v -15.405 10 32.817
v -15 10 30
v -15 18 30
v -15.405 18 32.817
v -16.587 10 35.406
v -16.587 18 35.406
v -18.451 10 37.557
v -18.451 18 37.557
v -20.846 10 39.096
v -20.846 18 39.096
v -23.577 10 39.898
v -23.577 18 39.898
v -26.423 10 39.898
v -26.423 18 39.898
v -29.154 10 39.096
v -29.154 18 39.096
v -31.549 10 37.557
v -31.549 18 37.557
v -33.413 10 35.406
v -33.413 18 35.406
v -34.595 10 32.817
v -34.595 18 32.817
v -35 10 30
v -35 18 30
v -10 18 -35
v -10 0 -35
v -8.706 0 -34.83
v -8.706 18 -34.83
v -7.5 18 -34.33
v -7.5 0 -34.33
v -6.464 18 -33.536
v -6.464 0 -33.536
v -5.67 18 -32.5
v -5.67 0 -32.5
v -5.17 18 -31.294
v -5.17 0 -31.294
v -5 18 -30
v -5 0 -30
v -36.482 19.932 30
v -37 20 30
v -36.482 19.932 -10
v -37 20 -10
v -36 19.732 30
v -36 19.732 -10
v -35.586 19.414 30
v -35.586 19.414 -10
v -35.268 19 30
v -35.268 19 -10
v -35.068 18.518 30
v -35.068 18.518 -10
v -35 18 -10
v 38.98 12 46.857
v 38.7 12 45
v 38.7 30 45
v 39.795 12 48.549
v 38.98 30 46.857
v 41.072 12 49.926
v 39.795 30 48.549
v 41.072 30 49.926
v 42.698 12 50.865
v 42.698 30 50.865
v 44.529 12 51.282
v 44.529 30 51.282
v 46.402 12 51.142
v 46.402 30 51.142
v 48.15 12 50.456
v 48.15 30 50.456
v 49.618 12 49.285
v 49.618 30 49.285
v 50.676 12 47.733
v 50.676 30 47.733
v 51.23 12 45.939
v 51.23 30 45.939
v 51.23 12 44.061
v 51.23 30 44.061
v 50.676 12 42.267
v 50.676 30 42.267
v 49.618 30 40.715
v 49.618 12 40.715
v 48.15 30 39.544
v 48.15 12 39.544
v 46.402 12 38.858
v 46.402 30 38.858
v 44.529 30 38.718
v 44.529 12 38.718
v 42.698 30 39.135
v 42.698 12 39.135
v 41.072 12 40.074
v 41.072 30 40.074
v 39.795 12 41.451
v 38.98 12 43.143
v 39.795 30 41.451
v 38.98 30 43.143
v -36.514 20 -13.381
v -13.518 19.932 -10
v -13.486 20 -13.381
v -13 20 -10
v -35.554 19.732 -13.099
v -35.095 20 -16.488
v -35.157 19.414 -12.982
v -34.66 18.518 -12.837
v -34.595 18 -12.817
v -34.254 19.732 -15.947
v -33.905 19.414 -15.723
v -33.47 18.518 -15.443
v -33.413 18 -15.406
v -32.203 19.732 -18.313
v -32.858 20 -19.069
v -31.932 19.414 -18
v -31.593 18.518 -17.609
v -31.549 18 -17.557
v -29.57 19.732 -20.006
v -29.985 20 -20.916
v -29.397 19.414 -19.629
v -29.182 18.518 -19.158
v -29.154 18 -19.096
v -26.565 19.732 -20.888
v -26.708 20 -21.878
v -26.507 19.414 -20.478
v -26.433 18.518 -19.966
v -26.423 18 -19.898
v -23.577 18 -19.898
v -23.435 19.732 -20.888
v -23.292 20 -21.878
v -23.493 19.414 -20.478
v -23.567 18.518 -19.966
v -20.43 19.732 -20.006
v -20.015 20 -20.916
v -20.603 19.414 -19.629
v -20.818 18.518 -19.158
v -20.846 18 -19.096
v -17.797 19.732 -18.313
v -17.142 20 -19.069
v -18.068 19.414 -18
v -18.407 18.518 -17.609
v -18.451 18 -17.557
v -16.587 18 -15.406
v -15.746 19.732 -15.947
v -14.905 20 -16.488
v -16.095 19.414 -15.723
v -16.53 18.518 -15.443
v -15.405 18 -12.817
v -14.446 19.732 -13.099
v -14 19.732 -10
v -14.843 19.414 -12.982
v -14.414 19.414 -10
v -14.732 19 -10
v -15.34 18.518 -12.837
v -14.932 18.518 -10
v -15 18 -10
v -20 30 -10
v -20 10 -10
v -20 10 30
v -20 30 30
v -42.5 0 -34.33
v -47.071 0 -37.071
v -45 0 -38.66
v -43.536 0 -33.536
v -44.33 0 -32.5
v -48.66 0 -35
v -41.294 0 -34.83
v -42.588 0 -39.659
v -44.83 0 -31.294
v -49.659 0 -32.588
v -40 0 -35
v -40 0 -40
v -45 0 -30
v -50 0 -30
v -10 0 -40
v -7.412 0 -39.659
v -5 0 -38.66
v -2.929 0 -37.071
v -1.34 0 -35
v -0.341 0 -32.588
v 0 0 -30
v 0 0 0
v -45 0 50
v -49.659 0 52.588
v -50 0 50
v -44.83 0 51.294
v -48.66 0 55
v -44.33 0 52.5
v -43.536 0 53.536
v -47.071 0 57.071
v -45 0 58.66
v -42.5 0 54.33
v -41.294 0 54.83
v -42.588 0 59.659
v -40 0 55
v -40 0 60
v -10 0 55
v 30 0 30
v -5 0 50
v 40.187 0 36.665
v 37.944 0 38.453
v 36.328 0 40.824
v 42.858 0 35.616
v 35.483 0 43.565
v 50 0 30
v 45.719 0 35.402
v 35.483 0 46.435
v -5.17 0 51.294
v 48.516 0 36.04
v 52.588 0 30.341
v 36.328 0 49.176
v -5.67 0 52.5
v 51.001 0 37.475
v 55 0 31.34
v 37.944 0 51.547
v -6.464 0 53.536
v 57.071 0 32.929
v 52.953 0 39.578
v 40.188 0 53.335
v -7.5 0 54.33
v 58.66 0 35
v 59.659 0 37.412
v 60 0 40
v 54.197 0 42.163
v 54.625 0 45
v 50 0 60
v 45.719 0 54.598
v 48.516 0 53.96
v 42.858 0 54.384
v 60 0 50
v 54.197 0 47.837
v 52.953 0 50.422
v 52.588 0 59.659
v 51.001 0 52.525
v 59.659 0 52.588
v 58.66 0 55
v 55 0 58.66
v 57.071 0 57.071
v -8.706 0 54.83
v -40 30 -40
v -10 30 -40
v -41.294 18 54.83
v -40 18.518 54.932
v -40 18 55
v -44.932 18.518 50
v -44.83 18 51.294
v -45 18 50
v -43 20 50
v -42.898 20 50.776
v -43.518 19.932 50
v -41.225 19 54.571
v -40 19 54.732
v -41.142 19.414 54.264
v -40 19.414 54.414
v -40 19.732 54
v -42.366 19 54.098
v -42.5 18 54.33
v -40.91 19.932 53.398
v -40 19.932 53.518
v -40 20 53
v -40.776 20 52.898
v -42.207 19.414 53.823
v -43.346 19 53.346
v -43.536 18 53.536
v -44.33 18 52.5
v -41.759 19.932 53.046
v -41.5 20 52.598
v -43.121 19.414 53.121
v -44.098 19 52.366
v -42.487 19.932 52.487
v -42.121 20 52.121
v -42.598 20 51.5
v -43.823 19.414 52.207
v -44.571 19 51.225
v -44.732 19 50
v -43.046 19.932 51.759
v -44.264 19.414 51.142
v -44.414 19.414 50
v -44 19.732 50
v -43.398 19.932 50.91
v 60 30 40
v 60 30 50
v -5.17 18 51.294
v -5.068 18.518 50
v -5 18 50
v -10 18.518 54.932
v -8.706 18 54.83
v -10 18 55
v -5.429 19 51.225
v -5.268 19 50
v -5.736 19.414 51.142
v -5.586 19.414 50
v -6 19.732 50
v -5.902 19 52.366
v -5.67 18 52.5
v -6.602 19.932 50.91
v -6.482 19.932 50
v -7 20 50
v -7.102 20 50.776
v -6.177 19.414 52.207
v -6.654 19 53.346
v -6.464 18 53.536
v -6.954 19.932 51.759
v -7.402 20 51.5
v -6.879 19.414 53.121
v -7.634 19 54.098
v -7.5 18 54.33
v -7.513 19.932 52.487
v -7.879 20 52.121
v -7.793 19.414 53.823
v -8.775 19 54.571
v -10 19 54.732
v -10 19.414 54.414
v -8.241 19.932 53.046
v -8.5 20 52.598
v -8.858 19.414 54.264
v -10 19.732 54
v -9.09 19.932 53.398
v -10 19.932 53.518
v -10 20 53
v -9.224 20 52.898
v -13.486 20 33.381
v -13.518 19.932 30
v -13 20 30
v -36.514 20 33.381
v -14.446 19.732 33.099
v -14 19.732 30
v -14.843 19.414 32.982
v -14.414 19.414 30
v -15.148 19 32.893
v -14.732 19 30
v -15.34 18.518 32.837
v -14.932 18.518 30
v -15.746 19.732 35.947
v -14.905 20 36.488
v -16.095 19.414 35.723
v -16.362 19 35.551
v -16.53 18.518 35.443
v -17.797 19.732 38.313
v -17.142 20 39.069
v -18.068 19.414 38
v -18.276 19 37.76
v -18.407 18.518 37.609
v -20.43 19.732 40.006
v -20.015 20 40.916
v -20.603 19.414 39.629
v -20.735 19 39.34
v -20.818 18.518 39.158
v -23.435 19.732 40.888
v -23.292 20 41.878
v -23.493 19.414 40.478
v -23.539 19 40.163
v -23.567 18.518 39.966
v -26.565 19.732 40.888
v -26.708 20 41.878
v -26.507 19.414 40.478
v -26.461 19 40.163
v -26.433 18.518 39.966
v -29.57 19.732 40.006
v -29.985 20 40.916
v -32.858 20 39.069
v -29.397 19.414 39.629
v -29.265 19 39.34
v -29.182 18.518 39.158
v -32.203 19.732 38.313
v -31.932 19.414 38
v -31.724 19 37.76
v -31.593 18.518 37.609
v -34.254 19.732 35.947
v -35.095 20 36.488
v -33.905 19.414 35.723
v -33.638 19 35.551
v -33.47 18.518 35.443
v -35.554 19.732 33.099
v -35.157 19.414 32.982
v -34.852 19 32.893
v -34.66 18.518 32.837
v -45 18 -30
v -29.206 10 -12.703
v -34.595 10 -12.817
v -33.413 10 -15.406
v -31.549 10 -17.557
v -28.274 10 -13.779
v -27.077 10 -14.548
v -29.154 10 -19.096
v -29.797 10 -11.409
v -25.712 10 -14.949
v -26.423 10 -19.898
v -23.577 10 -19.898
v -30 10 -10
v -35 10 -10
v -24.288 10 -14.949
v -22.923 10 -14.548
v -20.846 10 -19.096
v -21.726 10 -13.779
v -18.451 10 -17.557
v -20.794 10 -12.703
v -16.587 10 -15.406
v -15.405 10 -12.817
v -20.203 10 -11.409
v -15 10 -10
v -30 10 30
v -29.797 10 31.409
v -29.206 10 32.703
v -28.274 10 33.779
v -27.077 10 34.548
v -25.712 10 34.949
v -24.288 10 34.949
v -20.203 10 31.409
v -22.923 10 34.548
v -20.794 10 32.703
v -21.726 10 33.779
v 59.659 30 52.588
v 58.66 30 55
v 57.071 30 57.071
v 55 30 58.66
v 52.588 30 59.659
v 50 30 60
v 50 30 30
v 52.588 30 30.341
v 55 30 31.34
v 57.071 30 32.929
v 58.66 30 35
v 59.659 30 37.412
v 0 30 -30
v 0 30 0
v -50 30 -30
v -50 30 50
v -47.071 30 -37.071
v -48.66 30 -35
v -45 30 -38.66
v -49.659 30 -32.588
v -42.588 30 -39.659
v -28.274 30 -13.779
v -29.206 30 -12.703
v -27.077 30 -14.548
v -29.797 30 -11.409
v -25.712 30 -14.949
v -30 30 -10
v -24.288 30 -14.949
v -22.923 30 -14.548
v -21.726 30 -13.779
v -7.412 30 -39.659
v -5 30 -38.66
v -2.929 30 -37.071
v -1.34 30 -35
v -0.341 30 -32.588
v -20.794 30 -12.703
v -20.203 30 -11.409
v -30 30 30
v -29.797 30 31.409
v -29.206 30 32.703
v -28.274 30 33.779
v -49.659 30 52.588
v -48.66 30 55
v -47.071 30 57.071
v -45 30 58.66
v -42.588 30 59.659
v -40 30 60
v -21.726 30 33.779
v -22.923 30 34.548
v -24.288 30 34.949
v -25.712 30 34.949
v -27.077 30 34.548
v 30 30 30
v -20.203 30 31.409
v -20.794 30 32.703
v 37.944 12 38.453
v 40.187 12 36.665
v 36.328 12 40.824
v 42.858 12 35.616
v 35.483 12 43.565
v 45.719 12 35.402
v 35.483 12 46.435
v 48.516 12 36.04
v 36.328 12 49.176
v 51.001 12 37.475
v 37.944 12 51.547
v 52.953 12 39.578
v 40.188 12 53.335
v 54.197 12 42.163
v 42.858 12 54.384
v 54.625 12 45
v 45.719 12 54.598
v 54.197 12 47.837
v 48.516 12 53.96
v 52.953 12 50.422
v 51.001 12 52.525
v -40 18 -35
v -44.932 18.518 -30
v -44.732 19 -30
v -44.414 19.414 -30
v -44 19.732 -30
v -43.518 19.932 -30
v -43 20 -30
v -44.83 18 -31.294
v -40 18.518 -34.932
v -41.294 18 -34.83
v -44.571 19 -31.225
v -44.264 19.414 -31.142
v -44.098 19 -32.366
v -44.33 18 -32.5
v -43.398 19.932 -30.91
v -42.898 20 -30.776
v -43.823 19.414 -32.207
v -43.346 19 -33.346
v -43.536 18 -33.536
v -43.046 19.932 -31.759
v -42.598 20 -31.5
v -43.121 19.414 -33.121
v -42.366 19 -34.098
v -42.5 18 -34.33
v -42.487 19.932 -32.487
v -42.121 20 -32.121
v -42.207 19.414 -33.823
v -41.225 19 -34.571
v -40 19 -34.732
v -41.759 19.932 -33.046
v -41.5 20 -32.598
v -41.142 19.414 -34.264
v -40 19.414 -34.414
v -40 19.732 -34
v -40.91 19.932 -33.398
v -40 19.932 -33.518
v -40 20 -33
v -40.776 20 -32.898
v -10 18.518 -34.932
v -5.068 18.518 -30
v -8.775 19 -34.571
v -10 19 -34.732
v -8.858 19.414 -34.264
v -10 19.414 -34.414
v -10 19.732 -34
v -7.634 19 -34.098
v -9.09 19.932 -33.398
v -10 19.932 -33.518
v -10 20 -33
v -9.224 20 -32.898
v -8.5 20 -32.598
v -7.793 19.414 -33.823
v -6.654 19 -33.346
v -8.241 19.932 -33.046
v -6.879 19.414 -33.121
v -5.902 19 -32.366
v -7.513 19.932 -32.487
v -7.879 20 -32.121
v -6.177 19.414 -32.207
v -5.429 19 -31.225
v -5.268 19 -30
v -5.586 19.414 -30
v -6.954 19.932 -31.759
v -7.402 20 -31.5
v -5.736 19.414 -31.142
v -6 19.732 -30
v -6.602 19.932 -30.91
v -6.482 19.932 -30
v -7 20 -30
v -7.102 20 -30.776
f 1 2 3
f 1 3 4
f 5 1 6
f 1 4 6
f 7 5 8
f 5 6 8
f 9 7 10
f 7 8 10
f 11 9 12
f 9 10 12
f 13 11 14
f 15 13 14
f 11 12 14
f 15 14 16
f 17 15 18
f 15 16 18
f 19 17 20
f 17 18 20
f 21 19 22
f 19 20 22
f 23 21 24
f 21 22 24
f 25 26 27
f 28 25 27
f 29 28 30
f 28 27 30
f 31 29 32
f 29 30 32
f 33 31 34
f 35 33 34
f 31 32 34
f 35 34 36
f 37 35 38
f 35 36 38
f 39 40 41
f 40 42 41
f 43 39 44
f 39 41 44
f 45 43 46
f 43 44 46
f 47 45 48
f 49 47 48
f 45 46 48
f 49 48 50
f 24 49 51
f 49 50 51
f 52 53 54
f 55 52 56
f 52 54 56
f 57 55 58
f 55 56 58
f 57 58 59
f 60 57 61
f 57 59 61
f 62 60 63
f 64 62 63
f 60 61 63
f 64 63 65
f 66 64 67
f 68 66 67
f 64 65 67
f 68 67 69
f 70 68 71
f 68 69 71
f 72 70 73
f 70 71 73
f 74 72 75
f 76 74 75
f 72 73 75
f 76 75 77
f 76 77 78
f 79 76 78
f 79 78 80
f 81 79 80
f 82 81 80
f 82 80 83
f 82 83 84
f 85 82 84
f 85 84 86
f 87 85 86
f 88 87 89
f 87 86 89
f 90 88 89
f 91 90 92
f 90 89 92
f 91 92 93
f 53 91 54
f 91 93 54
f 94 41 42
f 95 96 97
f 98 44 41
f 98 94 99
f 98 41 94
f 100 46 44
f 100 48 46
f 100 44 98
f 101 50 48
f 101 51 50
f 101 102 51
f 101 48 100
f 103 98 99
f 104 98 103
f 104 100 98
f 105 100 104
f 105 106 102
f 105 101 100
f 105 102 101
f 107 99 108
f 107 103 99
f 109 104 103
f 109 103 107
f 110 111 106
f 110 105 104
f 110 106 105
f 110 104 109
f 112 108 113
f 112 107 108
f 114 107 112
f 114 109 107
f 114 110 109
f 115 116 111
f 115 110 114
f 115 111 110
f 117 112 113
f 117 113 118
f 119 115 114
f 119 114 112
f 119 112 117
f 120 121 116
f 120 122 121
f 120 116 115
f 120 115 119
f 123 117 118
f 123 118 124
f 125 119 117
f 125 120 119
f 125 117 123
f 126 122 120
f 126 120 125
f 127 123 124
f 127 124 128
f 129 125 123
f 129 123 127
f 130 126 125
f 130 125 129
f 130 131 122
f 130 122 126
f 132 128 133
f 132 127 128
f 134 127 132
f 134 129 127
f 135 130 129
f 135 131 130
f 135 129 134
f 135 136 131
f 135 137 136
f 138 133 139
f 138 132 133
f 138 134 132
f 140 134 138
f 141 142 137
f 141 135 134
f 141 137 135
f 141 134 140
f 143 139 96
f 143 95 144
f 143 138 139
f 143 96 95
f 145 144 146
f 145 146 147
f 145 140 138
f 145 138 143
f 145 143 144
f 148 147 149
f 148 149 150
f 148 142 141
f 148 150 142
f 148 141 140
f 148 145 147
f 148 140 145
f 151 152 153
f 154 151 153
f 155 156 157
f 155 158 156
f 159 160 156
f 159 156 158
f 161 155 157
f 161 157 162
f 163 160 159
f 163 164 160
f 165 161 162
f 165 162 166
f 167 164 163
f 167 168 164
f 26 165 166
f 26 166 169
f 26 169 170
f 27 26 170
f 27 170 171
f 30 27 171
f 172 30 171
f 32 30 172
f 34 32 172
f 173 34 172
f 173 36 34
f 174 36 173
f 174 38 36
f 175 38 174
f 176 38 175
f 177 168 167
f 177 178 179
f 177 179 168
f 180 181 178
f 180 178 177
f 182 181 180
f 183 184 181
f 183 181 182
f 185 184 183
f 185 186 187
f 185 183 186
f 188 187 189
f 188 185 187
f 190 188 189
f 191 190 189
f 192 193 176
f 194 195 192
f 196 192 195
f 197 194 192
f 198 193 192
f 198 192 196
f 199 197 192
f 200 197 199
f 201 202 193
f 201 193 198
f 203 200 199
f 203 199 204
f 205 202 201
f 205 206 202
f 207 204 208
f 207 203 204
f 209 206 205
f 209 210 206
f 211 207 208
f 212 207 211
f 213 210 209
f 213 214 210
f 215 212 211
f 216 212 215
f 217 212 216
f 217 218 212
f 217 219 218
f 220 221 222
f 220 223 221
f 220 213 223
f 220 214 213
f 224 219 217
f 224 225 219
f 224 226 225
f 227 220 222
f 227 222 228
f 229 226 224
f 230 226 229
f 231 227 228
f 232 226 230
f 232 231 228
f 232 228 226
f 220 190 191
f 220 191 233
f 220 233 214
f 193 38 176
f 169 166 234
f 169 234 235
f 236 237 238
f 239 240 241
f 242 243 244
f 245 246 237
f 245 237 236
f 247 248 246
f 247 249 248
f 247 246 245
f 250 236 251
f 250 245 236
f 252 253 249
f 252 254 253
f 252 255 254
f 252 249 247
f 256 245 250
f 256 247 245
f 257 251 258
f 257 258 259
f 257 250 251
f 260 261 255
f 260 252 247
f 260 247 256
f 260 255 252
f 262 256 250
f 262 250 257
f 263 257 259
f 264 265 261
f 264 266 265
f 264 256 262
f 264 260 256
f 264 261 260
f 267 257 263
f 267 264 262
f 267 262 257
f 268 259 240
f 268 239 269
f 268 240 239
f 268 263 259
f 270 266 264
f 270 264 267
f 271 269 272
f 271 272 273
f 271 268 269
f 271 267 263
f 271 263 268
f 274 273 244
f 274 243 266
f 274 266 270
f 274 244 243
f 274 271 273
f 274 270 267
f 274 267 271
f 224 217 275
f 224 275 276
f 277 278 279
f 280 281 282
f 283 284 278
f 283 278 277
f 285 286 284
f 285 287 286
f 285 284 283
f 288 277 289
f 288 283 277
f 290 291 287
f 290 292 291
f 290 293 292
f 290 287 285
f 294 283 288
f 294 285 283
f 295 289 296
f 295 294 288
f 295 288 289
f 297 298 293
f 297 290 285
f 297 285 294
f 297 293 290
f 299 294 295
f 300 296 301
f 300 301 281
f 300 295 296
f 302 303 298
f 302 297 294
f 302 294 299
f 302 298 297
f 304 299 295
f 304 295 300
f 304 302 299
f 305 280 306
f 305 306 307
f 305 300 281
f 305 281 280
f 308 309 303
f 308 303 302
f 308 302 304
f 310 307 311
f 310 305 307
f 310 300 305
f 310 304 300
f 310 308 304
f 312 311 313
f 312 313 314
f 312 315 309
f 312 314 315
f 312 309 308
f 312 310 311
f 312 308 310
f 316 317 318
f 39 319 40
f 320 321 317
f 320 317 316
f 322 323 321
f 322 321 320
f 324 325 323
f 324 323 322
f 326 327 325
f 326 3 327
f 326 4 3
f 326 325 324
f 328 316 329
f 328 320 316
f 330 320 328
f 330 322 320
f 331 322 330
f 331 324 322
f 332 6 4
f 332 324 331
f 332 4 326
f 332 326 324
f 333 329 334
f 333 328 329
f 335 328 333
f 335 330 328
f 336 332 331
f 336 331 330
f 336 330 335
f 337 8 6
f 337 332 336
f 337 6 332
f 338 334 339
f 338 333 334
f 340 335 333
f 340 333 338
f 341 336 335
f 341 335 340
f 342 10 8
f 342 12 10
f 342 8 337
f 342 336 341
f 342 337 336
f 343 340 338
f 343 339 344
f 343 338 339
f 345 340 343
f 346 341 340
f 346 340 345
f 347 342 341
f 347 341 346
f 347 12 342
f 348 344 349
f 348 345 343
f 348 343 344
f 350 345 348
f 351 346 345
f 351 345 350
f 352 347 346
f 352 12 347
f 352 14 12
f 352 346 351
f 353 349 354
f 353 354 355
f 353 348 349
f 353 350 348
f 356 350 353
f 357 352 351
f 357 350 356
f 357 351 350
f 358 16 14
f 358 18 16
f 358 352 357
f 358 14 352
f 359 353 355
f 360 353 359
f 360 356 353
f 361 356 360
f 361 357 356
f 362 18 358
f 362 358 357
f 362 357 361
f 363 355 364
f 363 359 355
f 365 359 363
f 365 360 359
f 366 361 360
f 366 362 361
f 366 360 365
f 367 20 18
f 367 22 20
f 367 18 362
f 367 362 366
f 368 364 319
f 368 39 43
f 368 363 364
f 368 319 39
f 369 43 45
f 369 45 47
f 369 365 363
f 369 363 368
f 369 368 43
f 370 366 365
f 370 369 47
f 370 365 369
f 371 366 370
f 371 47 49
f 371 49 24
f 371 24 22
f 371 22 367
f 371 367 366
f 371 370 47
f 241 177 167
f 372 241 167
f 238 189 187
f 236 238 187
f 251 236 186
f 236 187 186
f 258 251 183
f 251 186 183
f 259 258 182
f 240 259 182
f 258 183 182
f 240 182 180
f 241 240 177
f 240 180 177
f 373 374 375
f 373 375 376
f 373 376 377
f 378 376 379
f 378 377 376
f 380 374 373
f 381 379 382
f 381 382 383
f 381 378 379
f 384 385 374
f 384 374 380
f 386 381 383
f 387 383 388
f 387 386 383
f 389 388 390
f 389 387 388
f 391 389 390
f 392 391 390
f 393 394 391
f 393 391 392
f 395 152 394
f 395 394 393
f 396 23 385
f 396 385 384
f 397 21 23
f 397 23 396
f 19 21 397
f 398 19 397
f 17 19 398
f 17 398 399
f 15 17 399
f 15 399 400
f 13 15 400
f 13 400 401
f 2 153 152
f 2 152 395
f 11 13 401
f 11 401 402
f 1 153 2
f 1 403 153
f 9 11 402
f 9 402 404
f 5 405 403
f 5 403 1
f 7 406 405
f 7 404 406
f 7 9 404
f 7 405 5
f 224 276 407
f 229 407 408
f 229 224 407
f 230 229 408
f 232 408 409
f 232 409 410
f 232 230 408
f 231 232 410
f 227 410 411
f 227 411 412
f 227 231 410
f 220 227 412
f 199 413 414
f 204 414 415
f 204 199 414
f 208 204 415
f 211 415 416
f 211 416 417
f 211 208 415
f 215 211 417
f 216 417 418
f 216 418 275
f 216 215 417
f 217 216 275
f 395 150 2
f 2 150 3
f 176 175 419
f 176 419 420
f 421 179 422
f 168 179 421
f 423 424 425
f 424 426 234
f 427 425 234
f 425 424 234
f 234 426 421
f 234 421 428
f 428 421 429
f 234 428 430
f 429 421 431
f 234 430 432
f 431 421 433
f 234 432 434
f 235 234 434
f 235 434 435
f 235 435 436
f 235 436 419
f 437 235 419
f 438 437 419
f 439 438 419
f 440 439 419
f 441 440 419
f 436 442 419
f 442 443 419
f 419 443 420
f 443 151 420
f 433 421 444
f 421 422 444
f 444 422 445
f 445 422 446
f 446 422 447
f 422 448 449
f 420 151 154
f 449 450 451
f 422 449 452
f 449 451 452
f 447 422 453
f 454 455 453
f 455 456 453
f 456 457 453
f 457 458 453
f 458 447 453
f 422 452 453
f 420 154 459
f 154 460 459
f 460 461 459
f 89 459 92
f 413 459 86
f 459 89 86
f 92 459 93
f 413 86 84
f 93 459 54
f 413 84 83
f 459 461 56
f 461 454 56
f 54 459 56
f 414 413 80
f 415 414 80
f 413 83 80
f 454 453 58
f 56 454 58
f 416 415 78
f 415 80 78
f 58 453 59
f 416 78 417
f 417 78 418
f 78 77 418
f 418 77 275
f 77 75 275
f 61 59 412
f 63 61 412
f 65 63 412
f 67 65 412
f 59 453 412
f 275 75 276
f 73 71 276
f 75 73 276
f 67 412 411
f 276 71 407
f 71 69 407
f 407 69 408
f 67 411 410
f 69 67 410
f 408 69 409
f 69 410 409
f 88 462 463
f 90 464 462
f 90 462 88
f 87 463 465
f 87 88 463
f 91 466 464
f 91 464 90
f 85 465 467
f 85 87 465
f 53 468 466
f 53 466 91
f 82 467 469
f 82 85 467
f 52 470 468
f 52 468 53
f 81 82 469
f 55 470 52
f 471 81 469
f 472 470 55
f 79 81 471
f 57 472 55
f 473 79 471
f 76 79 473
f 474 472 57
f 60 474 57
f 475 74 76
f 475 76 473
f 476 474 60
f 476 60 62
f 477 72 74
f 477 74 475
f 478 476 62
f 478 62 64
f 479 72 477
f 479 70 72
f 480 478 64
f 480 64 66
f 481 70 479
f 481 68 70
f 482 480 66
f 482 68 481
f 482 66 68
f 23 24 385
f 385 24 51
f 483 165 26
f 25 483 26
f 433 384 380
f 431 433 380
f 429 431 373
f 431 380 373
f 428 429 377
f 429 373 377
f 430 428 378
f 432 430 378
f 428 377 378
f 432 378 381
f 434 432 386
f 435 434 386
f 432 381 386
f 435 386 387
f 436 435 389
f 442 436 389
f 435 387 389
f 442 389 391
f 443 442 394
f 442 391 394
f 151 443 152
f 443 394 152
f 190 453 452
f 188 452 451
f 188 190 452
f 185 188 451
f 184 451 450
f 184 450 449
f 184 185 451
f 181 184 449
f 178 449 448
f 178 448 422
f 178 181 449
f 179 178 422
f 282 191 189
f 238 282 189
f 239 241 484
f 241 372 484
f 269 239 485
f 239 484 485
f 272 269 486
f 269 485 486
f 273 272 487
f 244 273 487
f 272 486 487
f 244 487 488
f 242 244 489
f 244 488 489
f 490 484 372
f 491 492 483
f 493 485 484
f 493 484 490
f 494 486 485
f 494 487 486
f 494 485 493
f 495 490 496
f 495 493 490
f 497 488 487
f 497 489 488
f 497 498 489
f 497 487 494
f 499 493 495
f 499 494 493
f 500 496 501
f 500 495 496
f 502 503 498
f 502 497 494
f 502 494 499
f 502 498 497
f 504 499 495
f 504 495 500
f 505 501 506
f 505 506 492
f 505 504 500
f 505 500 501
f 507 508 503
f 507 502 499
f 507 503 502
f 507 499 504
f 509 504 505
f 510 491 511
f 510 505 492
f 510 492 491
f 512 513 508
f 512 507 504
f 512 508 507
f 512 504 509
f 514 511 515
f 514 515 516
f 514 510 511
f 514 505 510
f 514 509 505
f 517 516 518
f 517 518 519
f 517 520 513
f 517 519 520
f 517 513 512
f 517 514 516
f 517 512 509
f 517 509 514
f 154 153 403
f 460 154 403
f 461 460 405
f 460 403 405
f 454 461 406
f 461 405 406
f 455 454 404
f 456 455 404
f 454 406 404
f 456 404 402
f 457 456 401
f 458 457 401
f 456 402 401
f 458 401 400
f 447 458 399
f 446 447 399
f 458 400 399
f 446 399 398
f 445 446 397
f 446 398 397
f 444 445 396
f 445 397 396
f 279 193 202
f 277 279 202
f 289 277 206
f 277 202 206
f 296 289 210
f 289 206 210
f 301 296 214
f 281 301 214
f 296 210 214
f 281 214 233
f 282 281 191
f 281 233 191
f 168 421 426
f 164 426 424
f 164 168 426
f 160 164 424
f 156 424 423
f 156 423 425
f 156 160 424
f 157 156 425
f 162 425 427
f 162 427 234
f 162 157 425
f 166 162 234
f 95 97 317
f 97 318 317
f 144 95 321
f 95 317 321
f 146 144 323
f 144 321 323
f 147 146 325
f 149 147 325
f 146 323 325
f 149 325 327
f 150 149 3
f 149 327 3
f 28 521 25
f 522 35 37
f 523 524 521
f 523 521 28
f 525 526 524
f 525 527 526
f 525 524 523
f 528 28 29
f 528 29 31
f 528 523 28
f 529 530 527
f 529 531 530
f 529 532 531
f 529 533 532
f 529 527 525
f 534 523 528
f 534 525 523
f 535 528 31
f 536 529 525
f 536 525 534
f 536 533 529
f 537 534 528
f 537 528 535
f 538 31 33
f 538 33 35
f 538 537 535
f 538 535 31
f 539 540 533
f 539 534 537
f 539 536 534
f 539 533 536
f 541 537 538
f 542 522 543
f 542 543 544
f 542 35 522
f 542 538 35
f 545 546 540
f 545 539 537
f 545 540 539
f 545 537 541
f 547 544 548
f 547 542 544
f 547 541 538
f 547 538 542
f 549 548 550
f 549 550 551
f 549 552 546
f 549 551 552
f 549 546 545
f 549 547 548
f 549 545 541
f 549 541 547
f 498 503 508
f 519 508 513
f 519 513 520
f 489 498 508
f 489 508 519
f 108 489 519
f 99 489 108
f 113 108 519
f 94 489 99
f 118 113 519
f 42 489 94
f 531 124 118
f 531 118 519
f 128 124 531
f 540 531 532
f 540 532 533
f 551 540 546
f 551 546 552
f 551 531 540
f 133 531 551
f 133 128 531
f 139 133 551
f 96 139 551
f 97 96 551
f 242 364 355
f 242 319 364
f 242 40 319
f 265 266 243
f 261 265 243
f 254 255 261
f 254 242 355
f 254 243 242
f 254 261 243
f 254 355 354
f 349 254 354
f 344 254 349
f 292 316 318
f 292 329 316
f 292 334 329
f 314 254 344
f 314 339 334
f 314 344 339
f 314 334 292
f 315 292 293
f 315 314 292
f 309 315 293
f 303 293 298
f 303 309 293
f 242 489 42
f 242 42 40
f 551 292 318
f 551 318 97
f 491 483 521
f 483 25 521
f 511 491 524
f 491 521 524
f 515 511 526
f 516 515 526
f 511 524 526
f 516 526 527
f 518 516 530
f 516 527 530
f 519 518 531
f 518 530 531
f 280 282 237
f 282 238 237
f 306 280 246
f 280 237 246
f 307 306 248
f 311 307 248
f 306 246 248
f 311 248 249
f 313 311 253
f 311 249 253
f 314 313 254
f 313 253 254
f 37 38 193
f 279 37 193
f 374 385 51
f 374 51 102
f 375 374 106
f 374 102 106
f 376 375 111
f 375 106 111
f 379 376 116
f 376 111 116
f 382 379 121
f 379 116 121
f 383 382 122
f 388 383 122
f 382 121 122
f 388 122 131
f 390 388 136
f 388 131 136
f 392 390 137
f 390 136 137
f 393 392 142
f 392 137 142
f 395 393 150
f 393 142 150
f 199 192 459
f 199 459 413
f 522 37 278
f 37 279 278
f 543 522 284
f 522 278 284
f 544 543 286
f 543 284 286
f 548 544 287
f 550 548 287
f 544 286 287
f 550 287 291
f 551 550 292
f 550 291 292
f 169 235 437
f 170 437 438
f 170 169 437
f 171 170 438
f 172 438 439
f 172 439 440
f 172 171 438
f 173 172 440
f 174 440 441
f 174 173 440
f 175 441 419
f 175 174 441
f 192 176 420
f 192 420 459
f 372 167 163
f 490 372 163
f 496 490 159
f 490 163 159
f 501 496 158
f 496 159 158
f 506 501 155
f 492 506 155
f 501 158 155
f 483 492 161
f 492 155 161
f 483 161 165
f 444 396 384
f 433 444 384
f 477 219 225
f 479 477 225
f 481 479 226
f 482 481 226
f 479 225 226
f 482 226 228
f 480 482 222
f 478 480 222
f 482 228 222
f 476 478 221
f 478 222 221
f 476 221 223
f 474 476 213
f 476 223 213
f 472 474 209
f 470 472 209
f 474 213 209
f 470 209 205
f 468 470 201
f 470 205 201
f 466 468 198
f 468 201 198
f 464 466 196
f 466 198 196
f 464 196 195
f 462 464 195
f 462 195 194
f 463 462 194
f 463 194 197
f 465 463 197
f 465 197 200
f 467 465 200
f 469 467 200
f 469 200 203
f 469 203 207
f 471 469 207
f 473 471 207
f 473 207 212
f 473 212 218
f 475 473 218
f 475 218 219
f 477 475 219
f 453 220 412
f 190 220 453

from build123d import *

# Parameters (mm, degrees)
F1_DEPTH       = 30
F2_D           = 12.6
F2_CBORE_D     = 19.25
F2_CBORE_DEPTH = 12
F4_DEPTH       = 20
F7_DEPTH       = 10
F10_DEPTH      = 20.001
F11_R          = 2


with BuildPart() as f1:
    # F0 (on Front) → F1 (new body)
    with BuildSketch(Plane.XZ):
        with BuildLine():
            Line((0, -30), (0, 0))
            Line((0, 0), (30, 30))
            Line((30, 30), (50, 30))
            ThreePointArc((50, 30), (57.0710678119, 32.9289321881), (60, 40))
            Line((60, 40), (60, 50))
            ThreePointArc((60, 50), (57.0710678119, 57.0710678119), (50, 60))
            Line((50, 60), (-40, 60))
            ThreePointArc((-40, 60), (-47.0710678119, 57.0710678119), (-50, 50))
            Line((-50, 50), (-50, -30))
            ThreePointArc((-50, -30), (-47.0710678119, -37.0710678119), (-40, -40))
            Line((-40, -40), (-10, -40))
            ThreePointArc((-10, -40), (-2.9289321881, -37.0710678119), (0, -30))
        make_face()
    extrude(amount=-F1_DEPTH)

    # F2 (through all)
    with Locations(Plane.XZ):
        with Locations((45, 45)):
            CounterBoreHole(F2_D / 2, F2_CBORE_D / 2, F2_CBORE_DEPTH)

    # F3 (on face) → F4 (cut)
    with BuildSketch(Plane.XZ):
        with BuildLine():
            Line((-10, 55), (-40, 55))
            ThreePointArc((-40, 55), (-43.5355339059, 53.5355339059), (-45, 50))
            Line((-45, 50), (-45, -30))
            ThreePointArc((-45, -30), (-43.5355339059, -33.5355339059), (-40, -35))
            Line((-40, -35), (-10, -35))
            ThreePointArc((-10, -35), (-6.4644660941, -33.5355339059), (-5, -30))
            Line((-5, -30), (-5, 50))
            ThreePointArc((-5, 50), (-6.4644660941, 53.5355339059), (-10, 55))
        make_face()
    extrude(amount=-F4_DEPTH, mode=Mode.SUBTRACT)

    # F6 (on offset) → F7 (join)
    with BuildSketch(Plane.XZ.offset(-20)):
        with BuildLine():
            Line((-15, -10), (-15, 30))
            ThreePointArc((-15, 30), (-25, 40), (-35, 30))
            Line((-35, 30), (-35, -10))
            ThreePointArc((-35, -10), (-25, -20), (-15, -10))
        make_face()
    extrude(amount=F7_DEPTH)

    # F9 (on offset) → F10 (cut, through all)
    with BuildSketch(Plane.XZ.offset(-10)):
        with BuildLine():
            Line((-20, -10), (-20, 30))
            ThreePointArc((-20, 30), (-25, 35), (-30, 30))
            Line((-30, 30), (-30, -10))
            ThreePointArc((-30, -10), (-25, -15), (-20, -10))
        make_face()
    extrude(amount=-F10_DEPTH, mode=Mode.SUBTRACT)

    # F11
    f11_edges = [f1.edges().sort_by_distance(p)[0] for p in [
        (-6.464466, 20, 53.535534),
        (-5, 20, 10),
        (-25, 20, 55),
        (-6.464466, 20, -33.535534),
        (-43.535534, 20, 53.535534),
        (-25, 20, -35),
        (-45, 20, 10),
        (-43.535534, 20, -33.535534),
        (-15, 20, 10),
        (-25, 20, 40),
        (-35, 20, 10),
        (-25, 20, -20),
    ]]
    fillet(f11_edges, radius=F11_R)


solid = f1.part
